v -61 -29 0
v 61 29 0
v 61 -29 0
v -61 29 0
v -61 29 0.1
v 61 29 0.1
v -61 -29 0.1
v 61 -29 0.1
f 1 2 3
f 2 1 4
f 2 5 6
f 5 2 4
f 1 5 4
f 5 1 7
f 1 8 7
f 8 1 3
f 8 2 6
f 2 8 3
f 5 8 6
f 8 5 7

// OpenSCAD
// file: ../p/box5-12.scad
use <../lib.scad>
function ldraw_lib__box5_12() = [
// 0 Box with 5 Faces without Any Edges
// 0 Name: box5-12.dat
// 0 Author: Chris Dee [cwdee]
// 0 !LDRAW_ORG Primitive UPDATE 2009-02
// 0 !LICENSE Licensed under CC BY 4.0 : see CAreadme.txt
// 
// 0 BFC CERTIFY CCW
  [0,"BFC","CERTIFY"],
  [0,"BFC","CCW"],
// 
// 0 !HISTORY 2009-09-03 [PTadmin] Official Update 2009-02
// 
// 
// 4 16 1 1 1 1 1 -1 -1 1 -1 -1 1 1
  [4,16,1,1,1,1,1,-1,-1,1,-1,-1,1,1],
// 4 16 -1 0 1 1 0 1 1 1 1 -1 1 1
  [4,16,-1,0,1,1,0,1,1,1,1,-1,1,1],
// 4 16 -1 0 -1 -1 0 1 -1 1 1 -1 1 -1
  [4,16,-1,0,-1,-1,0,1,-1,1,1,-1,1,-1],
// 4 16 1 0 -1 -1 0 -1 -1 1 -1 1 1 -1
  [4,16,1,0,-1,-1,0,-1,-1,1,-1,1,1,-1],
// 4 16 1 0 1 1 0 -1 1 1 -1 1 1 1
  [4,16,1,0,1,1,0,-1,1,1,-1,1,1,1],
// 0
];
module ldraw_lib__box5_12(step=0, col=false, unit=2/5, alt=false, line=0.2, solid=!$preview)
    makepoly(ldraw_lib__box5_12(), step=step, col=col, unit=unit, alt=alt, line=line, solid=solid);
ldraw_lib__box5_12(line=0.2);
// main file
use <../lib.scad>
use <../p/box5-12.scad>
function ldraw_lib__6280006a() = [
// 0 Sticker  7.2 x 15.2 with BATMOBILE (1989) Specification
// 0 Name: 6280006a.dat
// 0 Author: Gabriel Läufer [Dr.Bricktacular]
// 0 !LDRAW_ORG Part UPDATE 2025-02
// 0 !LICENSE Licensed under CC BY 4.0 : see CAreadme.txt
// 
// 0 BFC CERTIFY CCW
  [0,"BFC","CERTIFY"],
  [0,"BFC","CCW"],
// 
// 0 !KEYWORDS Batmobile (1989), Bricklink 90498pb26, Set 76139
// 0 !KEYWORDS Tim Burton's Batman
// 
// 0 !HISTORY 2025-02-27 [OrionP] Official Update 2025-02
// 
// 1 16 0 -0.25 0 152.5 0 0 0 0.25 0 0 0 72.5 box5-12.dat
  [1,16,0,-0.25,0,152.5,0,0,0,0.25,0,0,0,72.5, ldraw_lib__box5_12()],
// 
// 0 !TEXMAP START PLANAR -152.5 -0.25 72.5 152.5 -0.25 72.5 -152.5 -0.25 -72.5 6280006a.png
// 0 !: 4 0 152.5 -0.25 72.5 -152.5 -0.25 72.5 -152.5 -0.25 -72.5 152.5 -0.25 -72.5
// 0 !TEXMAP FALLBACK
// 0 // Needs Work: fallback pattern
// 4 0 152.5 -0.25 72.5 -152.5 -0.25 72.5 -152.5 -0.25 -72.5 152.5 -0.25 -72.5
  [4,0,152.5,-0.25,72.5,-152.5,-0.25,72.5,-152.5,-0.25,-72.5,152.5,-0.25,-72.5],
// 0 !TEXMAP END
];
module ldraw_lib__6280006a(step=0, col=false, unit=2/5, alt=false, line=0.2, solid=!$preview)
    makepoly(ldraw_lib__6280006a(), step=step, col=col, unit=unit, alt=alt, line=line, solid=solid);
ldraw_lib__6280006a(line=0.2);
